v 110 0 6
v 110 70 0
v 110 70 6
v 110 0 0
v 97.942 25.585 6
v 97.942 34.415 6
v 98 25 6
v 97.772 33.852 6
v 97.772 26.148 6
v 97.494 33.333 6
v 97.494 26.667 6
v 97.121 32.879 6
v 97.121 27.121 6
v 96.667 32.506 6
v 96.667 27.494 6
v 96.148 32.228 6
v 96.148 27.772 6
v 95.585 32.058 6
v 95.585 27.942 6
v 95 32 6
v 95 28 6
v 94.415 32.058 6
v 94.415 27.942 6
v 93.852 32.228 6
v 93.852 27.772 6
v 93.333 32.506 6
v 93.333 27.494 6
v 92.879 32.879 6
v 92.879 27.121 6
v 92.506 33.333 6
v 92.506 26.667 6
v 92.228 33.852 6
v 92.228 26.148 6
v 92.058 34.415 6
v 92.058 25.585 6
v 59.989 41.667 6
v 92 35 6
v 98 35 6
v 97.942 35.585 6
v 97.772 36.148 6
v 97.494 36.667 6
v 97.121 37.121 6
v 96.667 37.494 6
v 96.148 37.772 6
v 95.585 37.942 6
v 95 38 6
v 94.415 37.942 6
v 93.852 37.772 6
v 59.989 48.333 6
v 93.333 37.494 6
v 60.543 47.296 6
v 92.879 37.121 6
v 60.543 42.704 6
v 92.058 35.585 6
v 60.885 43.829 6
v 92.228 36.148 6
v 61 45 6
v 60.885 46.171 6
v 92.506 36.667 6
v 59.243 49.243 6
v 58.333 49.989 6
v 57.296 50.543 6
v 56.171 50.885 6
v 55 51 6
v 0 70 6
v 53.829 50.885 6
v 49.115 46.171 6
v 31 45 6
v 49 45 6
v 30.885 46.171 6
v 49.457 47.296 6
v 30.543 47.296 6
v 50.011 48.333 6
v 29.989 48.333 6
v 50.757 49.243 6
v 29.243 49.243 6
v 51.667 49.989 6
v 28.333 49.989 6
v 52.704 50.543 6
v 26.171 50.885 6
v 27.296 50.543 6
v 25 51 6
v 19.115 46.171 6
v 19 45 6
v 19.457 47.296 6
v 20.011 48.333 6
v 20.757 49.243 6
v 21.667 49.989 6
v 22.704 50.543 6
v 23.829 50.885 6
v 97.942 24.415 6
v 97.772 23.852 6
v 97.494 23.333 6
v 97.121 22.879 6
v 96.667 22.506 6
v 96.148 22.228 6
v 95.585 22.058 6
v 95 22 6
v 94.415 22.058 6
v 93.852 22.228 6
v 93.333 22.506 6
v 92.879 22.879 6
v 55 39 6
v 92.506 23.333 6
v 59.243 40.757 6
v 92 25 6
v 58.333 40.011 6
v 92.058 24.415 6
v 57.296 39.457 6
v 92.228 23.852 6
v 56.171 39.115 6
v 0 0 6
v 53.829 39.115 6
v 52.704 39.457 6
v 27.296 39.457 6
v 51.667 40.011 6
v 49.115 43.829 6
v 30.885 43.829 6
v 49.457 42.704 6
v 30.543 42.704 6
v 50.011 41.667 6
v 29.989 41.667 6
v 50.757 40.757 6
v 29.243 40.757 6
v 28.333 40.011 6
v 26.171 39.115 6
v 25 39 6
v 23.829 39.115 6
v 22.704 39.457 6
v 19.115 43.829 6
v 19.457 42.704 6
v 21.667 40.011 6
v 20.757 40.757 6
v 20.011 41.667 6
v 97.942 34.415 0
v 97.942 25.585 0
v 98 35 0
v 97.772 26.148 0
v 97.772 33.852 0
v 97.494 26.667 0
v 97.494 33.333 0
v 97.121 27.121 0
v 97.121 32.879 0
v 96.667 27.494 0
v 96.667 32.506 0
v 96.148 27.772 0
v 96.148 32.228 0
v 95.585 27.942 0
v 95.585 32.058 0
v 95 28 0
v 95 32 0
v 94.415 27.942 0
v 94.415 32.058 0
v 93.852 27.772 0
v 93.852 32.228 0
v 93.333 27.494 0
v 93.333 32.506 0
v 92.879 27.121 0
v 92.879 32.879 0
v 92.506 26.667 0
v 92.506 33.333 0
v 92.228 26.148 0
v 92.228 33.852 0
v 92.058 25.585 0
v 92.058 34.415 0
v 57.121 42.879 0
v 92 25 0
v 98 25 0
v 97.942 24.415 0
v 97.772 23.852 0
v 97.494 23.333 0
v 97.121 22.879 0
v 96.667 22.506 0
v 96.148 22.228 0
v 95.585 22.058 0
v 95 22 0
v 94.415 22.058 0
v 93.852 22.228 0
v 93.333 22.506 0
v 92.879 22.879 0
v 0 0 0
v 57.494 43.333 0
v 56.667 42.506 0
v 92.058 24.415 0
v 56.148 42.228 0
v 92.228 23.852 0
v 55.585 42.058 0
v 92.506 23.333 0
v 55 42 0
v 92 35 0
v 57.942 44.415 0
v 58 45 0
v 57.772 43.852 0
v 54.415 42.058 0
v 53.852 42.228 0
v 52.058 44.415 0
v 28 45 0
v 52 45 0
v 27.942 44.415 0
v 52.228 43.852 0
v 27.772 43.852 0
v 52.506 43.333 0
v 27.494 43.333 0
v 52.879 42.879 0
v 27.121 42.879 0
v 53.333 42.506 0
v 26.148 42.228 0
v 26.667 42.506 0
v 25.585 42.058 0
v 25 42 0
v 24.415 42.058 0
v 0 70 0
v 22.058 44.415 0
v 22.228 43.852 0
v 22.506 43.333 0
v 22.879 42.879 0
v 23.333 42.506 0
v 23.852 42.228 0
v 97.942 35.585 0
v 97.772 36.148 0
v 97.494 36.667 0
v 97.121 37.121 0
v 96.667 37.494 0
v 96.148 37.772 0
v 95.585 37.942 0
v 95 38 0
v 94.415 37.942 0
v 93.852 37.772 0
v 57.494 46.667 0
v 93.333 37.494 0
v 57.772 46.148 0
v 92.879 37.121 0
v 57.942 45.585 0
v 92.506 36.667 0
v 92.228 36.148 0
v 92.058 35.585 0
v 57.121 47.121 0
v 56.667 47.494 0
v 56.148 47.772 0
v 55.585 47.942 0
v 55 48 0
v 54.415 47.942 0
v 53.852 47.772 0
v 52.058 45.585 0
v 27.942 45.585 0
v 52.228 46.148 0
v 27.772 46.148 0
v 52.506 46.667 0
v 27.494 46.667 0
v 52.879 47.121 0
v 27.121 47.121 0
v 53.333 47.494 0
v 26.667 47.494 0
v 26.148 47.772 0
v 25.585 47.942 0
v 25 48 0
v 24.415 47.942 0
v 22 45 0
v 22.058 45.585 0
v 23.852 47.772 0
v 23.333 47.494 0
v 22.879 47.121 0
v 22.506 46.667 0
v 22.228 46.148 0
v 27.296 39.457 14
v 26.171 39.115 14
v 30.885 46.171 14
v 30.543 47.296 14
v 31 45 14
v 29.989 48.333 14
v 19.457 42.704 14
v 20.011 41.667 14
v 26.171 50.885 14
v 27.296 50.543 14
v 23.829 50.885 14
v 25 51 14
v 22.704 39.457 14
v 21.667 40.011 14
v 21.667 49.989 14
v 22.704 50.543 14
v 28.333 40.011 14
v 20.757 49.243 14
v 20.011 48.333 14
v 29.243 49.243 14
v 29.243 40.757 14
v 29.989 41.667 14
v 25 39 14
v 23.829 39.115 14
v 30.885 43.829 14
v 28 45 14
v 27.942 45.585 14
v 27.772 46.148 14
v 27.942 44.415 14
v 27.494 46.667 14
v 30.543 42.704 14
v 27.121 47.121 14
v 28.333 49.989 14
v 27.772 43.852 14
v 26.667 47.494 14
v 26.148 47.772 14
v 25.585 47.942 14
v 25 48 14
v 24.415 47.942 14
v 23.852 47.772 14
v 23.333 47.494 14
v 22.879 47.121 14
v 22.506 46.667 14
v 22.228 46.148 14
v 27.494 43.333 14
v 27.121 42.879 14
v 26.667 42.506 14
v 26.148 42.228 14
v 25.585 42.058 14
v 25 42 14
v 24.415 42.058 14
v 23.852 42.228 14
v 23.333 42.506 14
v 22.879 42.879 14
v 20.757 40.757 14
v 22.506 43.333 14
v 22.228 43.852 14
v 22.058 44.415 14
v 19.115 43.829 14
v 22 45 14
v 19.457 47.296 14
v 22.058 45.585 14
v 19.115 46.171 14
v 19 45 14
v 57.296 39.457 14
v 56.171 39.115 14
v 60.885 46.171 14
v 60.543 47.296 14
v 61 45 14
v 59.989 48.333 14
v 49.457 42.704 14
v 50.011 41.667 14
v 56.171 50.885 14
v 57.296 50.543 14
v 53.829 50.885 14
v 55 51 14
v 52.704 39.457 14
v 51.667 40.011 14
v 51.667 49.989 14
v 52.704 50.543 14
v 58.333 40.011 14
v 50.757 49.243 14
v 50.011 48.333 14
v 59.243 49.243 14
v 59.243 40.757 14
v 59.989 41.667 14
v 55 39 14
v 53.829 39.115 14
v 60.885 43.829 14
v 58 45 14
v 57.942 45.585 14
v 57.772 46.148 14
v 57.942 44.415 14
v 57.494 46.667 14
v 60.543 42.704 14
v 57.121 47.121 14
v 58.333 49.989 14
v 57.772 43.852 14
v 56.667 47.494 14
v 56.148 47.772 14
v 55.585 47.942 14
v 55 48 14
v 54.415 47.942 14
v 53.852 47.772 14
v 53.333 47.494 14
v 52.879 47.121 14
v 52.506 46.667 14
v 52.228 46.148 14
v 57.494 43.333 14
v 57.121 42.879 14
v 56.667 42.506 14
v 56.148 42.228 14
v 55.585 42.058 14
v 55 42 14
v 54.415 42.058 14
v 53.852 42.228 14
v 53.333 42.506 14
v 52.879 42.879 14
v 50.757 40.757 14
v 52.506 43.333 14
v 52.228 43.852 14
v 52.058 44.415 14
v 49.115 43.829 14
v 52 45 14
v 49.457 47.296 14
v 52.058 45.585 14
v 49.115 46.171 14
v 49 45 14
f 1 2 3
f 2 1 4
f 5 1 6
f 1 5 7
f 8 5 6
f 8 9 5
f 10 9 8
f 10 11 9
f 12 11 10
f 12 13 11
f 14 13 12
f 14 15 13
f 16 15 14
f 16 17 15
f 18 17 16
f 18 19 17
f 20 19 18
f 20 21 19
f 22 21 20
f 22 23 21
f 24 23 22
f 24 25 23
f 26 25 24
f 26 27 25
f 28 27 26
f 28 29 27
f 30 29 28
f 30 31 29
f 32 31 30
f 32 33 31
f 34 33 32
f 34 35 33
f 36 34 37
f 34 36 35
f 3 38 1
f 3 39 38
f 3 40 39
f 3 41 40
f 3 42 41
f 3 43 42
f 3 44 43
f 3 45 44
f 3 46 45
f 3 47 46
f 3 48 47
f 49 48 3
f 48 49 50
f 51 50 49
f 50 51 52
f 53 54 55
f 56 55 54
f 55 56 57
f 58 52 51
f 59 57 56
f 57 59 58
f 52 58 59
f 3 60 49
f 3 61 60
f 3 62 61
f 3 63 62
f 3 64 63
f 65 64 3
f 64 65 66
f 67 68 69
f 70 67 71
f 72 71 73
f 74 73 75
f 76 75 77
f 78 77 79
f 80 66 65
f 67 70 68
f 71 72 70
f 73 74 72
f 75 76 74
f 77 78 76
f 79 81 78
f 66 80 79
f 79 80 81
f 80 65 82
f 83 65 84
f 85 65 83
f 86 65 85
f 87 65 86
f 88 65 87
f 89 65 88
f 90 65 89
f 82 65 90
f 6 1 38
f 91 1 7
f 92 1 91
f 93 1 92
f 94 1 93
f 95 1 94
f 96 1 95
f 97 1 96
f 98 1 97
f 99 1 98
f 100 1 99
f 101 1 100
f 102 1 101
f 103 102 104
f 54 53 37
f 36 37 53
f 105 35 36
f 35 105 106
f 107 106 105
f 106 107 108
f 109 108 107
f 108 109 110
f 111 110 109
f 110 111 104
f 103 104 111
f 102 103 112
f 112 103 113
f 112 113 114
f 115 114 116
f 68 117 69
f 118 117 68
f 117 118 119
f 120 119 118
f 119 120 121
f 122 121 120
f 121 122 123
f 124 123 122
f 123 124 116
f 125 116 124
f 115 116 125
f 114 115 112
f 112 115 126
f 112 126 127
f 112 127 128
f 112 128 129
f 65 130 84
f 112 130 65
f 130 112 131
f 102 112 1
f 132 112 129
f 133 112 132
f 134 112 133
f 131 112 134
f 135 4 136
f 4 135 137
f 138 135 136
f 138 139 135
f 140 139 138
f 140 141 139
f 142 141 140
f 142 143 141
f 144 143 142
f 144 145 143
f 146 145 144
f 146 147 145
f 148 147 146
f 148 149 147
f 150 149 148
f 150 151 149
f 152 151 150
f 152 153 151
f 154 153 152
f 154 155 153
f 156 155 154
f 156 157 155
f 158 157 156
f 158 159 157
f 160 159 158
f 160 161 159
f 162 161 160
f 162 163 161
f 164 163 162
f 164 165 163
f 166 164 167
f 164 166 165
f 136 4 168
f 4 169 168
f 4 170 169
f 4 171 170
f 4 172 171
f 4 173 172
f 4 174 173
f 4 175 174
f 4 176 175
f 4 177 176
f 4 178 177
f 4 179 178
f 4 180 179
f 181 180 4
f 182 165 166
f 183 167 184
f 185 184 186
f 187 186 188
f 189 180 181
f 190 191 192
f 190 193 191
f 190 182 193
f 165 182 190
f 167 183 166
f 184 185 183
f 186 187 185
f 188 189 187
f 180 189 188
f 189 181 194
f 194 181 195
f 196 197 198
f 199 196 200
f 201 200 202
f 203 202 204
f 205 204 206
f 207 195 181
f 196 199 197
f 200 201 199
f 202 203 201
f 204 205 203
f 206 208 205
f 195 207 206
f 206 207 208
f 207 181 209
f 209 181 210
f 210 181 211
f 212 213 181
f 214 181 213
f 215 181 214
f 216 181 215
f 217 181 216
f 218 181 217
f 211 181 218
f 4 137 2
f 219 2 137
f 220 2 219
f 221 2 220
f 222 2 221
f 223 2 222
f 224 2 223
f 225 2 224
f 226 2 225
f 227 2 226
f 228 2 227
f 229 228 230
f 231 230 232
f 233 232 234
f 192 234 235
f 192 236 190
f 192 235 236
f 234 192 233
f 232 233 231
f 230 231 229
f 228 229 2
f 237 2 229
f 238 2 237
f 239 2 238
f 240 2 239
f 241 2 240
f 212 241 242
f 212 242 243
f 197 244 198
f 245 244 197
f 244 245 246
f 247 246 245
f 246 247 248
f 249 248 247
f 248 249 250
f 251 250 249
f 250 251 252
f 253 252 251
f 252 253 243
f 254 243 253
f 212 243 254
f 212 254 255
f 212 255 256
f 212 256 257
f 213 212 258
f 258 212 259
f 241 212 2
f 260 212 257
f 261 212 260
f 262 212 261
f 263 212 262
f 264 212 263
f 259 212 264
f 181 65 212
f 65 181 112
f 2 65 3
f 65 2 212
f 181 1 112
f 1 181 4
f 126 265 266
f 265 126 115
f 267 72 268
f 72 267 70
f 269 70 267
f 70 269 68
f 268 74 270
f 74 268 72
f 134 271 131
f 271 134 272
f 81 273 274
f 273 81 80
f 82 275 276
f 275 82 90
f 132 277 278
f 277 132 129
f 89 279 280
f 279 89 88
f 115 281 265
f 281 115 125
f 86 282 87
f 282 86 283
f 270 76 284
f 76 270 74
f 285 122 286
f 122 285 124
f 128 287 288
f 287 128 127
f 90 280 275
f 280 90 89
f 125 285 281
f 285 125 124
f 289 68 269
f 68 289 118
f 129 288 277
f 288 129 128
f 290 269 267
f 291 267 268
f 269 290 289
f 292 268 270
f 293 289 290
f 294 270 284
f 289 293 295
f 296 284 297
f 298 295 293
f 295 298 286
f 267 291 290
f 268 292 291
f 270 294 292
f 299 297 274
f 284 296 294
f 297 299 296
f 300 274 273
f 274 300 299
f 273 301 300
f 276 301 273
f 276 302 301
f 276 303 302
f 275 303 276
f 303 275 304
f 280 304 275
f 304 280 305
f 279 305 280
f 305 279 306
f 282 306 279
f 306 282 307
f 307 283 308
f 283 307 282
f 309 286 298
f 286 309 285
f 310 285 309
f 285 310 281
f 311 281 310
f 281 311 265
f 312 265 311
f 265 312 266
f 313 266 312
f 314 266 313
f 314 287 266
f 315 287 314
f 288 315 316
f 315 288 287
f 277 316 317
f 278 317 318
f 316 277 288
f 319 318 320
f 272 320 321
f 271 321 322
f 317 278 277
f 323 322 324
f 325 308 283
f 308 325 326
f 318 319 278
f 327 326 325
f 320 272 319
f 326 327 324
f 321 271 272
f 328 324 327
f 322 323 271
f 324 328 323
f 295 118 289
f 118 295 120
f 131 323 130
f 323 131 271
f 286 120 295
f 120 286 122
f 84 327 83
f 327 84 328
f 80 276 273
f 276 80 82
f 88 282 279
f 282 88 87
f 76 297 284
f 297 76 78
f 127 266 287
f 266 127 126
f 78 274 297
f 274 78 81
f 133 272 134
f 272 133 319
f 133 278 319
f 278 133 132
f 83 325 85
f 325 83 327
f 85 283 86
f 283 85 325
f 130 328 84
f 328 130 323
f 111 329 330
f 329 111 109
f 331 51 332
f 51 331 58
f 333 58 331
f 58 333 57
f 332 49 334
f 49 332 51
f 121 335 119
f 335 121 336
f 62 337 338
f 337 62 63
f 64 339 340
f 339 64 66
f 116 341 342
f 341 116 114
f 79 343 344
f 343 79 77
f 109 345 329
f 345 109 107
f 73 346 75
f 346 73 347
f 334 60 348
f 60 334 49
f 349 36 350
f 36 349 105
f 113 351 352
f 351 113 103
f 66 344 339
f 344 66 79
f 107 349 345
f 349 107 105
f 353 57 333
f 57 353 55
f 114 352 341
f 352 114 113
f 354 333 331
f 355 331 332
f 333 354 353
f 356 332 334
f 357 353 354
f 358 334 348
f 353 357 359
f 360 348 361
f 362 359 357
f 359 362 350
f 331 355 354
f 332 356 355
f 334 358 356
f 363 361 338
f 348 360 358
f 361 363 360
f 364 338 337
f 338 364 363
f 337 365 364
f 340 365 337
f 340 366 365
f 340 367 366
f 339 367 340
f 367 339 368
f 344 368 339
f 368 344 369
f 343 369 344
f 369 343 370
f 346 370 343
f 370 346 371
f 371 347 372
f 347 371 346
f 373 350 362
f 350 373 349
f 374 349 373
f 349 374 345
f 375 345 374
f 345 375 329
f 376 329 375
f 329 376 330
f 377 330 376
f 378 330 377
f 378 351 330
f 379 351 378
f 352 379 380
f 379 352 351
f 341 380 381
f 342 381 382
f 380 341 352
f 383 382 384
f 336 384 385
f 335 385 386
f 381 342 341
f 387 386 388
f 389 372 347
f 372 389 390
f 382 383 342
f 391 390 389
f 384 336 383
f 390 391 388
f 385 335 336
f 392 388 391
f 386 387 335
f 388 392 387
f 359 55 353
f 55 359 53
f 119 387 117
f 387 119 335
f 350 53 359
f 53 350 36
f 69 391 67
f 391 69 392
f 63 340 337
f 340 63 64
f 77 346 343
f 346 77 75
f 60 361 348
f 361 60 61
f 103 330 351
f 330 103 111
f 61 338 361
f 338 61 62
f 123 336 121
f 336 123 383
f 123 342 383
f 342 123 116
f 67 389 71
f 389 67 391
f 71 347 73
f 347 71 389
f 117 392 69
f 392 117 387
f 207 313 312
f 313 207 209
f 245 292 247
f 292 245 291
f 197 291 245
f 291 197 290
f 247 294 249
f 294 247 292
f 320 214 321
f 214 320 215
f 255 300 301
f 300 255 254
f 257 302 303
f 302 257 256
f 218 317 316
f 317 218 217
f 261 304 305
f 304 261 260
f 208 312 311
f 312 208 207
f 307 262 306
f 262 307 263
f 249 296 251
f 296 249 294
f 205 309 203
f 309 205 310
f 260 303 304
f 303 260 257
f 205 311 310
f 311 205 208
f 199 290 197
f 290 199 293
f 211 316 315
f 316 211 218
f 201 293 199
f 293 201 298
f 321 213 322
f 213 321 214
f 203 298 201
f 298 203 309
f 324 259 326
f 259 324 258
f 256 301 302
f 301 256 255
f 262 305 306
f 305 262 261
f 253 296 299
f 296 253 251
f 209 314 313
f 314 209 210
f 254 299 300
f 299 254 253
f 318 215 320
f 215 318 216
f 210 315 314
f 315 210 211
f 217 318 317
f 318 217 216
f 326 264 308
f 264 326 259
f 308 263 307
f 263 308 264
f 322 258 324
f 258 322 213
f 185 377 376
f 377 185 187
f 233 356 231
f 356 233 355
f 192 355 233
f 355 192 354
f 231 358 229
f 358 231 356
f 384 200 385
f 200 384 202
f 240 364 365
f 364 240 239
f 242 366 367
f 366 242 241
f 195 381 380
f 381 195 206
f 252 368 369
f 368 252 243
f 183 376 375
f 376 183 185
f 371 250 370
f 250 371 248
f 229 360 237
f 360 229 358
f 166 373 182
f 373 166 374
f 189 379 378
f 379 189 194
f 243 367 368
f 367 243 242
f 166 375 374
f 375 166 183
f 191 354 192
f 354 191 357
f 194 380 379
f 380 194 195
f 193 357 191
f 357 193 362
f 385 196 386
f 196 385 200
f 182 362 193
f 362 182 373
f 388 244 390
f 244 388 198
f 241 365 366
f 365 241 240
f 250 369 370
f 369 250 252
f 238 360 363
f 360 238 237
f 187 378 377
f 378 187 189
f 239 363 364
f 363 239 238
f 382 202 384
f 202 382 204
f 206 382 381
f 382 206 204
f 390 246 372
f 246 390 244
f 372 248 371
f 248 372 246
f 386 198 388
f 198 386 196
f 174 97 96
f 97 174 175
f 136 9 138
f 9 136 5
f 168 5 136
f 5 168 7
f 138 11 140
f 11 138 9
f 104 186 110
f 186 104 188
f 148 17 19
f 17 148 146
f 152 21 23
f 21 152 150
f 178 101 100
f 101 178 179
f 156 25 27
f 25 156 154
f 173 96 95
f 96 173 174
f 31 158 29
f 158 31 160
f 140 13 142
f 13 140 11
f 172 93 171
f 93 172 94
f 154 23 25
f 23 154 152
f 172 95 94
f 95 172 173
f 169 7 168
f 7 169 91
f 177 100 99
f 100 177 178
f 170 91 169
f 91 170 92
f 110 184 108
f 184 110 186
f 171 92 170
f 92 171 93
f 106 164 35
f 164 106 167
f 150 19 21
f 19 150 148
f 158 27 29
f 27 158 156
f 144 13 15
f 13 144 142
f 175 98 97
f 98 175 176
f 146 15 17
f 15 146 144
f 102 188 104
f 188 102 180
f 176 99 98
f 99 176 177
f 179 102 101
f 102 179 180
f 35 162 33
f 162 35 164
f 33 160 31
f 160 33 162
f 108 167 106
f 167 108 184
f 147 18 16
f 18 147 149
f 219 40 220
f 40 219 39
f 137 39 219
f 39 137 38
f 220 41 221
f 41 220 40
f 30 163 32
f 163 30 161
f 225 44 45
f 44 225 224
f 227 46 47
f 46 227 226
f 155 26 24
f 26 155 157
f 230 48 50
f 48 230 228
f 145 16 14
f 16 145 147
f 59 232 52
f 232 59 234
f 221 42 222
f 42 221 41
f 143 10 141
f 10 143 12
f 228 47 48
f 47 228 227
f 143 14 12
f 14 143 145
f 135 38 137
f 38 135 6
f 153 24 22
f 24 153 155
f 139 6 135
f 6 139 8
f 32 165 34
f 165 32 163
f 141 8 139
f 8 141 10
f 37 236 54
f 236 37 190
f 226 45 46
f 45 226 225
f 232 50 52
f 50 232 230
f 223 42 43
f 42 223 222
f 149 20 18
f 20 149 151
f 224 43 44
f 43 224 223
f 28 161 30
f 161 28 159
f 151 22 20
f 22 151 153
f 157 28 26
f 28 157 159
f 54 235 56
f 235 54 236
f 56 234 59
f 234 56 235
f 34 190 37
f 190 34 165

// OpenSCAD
$fn = 32;

// ----------------------------------------------------------------------
// Mixed field: bosses and holes at given coordinates
// ----------------------------------------------------------------------

// --- parameters (mm) ---
plate_l = 110;            // plate length, X
plate_w = 70;             // plate width, Y
plate_t = 6;              // plate thickness, Z
boss_d = 12;              // boss diameter
boss_h = 8;               // boss height above the plate
hole_d = 6;               // through hole diameter

total_h = plate_t + boss_h;  // overall height

difference() {
  union() {
    cube([plate_l, plate_w, plate_t]);
    translate([25, 45, plate_t]) cylinder(h = boss_h, d = boss_d);
    translate([55, 45, plate_t]) cylinder(h = boss_h, d = boss_d);
  }
  translate([25, 45, -1]) cylinder(h = total_h + 2, d = boss_d / 2);
  translate([55, 45, -1]) cylinder(h = total_h + 2, d = boss_d / 2);
  translate([95, 25, -1]) cylinder(h = plate_t + 2, d = hole_d);
  translate([95, 35, -1]) cylinder(h = plate_t + 2, d = hole_d);
}
